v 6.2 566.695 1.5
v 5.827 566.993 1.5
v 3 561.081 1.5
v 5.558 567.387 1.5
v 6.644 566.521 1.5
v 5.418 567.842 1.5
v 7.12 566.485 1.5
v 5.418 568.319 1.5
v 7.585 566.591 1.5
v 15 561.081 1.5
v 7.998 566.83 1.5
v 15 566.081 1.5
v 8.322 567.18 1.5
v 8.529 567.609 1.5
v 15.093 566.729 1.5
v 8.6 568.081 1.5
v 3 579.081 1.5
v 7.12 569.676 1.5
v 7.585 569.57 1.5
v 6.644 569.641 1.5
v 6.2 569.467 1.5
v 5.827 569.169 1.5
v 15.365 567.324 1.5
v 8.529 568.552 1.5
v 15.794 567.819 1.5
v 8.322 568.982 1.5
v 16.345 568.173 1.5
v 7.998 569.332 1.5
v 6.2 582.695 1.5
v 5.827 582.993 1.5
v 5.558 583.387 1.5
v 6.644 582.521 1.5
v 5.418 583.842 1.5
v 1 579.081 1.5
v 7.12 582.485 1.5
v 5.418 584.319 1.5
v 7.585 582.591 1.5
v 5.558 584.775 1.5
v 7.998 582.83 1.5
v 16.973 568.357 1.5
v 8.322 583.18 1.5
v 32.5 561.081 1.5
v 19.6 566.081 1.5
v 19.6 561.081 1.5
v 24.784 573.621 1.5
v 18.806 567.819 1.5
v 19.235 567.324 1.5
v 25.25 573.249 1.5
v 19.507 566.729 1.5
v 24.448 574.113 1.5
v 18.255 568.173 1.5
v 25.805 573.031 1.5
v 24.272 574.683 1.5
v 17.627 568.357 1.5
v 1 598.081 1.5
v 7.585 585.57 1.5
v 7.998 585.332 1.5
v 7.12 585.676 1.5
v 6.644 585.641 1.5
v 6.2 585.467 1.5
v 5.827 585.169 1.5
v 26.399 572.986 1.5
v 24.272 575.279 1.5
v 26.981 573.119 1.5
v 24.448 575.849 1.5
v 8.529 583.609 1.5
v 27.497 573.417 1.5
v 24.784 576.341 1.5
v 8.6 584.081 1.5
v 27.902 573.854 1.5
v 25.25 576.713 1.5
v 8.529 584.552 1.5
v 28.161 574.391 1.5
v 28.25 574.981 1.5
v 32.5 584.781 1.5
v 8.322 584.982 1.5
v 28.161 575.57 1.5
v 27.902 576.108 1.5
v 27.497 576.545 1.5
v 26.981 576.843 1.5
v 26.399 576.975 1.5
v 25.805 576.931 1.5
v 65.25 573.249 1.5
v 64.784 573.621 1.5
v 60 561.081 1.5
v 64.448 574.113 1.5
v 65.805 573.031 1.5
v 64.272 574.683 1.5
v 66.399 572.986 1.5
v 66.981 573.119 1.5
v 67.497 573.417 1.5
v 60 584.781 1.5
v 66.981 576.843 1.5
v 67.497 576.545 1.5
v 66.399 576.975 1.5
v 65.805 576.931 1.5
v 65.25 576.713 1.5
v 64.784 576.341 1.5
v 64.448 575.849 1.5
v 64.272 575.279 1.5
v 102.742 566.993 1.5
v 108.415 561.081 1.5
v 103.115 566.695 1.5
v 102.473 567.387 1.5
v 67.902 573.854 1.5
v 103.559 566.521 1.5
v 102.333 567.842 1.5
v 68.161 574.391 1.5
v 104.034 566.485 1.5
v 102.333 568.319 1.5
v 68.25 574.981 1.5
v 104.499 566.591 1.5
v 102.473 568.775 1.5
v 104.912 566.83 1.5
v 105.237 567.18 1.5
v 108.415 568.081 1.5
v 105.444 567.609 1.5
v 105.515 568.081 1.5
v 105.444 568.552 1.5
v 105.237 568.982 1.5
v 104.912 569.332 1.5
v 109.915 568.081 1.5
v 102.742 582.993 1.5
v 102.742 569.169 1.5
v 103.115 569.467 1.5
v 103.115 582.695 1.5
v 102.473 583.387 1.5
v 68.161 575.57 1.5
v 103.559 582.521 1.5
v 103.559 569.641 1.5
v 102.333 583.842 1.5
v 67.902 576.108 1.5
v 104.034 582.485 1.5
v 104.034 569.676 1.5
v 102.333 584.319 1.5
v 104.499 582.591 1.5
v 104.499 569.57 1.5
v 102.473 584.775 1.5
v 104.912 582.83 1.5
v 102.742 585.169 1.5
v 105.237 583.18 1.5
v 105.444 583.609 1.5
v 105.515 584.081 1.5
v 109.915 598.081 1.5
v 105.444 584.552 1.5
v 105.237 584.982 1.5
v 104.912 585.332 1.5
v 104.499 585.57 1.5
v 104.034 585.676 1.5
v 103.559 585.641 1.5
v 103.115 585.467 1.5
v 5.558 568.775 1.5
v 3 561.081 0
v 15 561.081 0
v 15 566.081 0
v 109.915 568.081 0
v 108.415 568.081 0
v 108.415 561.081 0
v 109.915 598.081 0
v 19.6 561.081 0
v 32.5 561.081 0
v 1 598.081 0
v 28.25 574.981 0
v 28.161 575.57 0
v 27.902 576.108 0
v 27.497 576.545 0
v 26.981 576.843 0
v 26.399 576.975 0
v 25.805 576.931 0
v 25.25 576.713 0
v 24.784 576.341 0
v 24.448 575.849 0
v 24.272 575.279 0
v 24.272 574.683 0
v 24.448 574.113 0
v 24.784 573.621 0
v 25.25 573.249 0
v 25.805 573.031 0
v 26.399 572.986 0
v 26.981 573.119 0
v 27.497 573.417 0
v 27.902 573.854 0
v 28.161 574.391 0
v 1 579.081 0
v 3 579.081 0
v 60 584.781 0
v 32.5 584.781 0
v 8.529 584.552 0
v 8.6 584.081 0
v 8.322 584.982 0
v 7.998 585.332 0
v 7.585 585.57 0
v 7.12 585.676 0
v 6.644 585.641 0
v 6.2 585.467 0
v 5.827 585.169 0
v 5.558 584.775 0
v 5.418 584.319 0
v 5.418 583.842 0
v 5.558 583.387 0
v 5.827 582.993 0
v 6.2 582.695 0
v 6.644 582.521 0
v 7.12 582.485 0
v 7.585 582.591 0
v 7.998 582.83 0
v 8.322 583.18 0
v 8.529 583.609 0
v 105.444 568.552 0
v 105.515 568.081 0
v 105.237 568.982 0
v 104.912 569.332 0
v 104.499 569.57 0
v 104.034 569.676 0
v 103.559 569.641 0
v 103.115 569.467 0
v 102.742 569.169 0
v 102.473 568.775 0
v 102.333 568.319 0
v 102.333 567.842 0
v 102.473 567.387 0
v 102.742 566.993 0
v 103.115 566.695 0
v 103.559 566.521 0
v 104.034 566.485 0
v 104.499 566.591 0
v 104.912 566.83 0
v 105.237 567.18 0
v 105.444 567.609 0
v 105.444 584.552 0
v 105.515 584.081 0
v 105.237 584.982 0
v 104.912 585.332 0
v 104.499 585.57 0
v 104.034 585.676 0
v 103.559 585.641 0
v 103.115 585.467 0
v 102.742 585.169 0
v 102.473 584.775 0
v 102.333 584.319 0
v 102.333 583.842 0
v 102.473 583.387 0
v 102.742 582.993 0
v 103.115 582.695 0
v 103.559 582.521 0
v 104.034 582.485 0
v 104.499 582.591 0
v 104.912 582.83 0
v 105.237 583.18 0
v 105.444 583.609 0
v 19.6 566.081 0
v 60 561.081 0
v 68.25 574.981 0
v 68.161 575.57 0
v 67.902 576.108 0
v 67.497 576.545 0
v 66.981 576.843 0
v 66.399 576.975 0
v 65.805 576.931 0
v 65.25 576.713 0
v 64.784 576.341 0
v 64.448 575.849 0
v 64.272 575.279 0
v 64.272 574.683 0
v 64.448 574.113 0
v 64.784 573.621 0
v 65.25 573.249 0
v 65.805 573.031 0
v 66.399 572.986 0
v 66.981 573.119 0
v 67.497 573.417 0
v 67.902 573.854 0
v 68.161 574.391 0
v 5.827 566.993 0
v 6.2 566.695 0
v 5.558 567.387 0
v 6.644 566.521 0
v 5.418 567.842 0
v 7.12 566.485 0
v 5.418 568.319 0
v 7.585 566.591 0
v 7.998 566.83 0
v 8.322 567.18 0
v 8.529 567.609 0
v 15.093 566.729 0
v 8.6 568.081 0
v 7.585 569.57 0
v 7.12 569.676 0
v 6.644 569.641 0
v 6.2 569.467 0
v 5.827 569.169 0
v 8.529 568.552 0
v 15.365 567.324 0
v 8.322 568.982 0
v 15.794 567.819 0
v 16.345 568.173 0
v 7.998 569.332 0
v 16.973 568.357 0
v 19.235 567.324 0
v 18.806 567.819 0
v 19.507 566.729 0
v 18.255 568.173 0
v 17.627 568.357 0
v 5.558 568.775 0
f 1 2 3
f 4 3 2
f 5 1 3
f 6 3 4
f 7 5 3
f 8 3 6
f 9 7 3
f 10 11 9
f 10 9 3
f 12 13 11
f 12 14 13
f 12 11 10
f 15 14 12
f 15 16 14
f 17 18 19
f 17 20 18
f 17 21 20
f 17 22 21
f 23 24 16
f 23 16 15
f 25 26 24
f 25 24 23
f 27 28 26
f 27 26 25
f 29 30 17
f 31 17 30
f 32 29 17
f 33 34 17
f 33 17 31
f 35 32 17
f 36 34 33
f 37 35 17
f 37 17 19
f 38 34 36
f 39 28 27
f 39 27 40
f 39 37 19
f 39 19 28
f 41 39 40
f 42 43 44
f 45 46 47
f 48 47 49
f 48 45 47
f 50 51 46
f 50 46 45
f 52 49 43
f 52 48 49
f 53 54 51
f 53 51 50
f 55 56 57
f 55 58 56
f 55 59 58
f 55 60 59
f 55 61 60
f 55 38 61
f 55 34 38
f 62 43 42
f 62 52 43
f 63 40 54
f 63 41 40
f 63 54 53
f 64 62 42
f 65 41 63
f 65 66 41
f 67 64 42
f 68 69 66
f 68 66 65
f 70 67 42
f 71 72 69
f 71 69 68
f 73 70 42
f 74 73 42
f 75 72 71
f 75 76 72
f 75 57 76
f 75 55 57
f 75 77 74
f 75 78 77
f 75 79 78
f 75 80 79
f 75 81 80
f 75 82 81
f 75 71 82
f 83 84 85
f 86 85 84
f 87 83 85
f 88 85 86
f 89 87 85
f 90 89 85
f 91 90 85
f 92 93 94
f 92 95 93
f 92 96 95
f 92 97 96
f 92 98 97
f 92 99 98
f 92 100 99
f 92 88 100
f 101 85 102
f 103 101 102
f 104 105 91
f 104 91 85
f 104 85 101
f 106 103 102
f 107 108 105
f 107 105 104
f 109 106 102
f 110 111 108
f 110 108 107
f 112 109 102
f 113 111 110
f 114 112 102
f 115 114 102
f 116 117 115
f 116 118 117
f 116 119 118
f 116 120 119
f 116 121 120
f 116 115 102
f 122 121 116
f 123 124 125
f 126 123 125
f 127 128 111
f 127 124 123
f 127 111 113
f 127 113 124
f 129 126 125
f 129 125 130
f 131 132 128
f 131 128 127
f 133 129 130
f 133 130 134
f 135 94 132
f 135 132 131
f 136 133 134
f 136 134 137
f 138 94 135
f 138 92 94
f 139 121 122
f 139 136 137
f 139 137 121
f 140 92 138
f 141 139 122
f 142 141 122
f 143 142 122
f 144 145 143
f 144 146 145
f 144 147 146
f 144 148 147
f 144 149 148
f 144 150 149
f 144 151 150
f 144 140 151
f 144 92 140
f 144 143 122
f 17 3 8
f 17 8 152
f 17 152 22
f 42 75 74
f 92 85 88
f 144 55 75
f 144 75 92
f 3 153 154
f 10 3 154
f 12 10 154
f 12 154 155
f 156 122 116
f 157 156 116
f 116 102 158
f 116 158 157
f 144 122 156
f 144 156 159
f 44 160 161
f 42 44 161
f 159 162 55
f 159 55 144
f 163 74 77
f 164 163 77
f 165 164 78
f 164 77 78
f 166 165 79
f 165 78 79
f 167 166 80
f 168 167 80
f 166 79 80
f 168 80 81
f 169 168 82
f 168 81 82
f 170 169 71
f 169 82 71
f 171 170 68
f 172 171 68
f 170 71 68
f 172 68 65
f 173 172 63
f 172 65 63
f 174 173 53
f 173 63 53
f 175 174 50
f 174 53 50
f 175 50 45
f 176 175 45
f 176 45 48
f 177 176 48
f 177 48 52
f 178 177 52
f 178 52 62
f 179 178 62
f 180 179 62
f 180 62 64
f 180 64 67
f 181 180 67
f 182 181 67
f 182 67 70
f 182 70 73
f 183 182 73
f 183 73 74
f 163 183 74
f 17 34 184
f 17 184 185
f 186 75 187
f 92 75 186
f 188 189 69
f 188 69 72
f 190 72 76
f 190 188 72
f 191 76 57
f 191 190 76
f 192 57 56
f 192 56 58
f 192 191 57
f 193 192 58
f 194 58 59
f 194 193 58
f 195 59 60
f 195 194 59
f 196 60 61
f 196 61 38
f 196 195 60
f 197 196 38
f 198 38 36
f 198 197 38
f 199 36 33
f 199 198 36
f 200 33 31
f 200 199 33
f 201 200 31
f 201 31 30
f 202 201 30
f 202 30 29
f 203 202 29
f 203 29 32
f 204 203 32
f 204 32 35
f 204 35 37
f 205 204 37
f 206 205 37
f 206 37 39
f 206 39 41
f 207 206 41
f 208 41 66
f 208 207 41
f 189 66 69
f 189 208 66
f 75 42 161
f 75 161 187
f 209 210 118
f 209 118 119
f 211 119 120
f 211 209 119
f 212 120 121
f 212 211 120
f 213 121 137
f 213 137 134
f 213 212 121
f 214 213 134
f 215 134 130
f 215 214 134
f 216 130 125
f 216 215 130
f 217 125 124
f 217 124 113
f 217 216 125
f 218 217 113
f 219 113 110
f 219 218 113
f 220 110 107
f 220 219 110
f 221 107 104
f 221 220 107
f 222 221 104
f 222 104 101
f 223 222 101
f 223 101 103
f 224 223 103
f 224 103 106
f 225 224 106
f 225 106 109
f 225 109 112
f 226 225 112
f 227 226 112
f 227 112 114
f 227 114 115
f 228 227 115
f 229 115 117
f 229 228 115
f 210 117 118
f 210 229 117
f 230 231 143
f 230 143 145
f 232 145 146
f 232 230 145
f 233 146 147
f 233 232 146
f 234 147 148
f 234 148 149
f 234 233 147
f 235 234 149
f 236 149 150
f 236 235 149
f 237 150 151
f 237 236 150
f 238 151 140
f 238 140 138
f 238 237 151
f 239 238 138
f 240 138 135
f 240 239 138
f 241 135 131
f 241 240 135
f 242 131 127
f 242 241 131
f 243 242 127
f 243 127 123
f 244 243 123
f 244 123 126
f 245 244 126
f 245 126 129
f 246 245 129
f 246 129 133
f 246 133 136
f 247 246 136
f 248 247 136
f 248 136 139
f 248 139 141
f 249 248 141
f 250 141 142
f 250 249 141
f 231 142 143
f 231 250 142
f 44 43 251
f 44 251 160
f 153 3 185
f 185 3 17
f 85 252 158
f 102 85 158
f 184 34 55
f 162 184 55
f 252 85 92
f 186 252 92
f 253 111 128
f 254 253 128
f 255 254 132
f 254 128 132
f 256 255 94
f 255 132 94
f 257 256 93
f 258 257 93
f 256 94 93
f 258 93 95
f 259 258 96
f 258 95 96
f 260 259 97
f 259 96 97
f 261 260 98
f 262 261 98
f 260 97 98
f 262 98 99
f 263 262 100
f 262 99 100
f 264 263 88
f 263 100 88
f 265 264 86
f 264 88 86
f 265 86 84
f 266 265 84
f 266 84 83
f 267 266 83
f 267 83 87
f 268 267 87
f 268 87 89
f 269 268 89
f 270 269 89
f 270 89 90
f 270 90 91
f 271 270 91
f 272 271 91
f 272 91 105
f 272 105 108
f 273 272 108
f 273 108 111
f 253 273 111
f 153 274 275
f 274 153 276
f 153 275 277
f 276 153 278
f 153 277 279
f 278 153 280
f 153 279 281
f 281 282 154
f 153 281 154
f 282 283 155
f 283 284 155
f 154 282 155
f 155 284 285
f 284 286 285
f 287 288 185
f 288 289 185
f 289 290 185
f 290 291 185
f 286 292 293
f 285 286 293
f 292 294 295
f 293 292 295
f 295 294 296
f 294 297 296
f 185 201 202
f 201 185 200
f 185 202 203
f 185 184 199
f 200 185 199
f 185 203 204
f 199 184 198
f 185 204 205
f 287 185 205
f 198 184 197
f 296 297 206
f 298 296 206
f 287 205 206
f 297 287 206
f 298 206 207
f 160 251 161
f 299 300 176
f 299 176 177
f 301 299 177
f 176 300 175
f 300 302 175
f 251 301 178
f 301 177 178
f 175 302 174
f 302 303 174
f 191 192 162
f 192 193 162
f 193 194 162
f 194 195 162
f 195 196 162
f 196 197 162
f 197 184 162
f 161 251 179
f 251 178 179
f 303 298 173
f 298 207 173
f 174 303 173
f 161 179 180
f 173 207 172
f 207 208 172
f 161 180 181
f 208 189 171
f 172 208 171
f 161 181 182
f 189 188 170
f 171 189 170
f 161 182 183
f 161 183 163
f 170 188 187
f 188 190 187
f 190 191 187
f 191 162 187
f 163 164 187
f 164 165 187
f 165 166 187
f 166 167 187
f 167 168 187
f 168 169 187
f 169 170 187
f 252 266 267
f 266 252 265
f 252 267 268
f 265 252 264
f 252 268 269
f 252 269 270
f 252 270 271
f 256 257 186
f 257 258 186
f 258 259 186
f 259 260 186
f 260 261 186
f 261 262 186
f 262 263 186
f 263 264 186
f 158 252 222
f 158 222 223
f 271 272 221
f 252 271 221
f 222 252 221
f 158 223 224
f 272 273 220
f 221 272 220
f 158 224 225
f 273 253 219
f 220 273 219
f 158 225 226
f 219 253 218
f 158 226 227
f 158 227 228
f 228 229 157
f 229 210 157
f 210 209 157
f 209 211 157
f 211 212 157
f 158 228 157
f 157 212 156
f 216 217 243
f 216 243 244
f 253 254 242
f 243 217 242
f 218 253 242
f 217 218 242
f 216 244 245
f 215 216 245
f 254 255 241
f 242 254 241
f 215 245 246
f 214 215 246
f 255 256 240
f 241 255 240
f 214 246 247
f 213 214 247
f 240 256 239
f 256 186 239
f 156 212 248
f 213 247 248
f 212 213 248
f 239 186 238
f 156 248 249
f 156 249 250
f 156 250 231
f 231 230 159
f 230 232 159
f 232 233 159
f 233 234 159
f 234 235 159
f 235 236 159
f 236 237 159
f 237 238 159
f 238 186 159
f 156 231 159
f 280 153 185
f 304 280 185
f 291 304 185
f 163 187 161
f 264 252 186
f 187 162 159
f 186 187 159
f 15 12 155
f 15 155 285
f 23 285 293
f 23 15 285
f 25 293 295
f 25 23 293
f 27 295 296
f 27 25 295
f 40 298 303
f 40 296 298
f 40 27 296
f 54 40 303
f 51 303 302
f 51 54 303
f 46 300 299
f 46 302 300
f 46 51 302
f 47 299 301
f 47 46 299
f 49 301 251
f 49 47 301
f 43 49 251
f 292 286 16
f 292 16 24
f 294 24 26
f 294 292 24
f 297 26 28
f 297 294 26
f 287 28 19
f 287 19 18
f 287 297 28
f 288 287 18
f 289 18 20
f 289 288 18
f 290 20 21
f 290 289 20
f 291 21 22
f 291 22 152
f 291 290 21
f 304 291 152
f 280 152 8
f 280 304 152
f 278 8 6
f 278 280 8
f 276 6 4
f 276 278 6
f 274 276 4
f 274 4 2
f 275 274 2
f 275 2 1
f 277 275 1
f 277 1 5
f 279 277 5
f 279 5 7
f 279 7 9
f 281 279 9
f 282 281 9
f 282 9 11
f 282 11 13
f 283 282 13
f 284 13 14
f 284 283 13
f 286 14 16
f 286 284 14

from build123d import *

# Parameters (mm, degrees)
SKETCH1_W           = 110.914742868
SKETCH1_H           = 37
SKETCH1_R           = 1.6
BOSS_EXTRUDE1_DEPTH = 1.5
SKETCH2_W           = 3
SKETCH2_H           = 18
CUT_EXTRUDE1_DEPTH  = 1.5
SKETCH3_W           = 1.5
SKETCH3_H           = 7
SKETCH3_W_2         = 1
SKETCH3_H_2         = 30
SKETCH3_H_3         = 19
CUT_EXTRUDE2_DEPTH  = 10
SKETCH4_R           = 2
SKETCH4_W           = 27.5
SKETCH4_H           = 23.7
CUT_EXTRUDE3_DEPTH  = 10


with BuildPart() as part:
    # Sketch1 → Boss-Extrude1 (new body)
    with BuildSketch(Plane.XY):
        with Locations((55.457371434, 579.580871166)):
            Rectangle(SKETCH1_W, SKETCH1_H)
        with Locations((103.914742868, 584.080871166)):
            Circle(SKETCH1_R, mode=Mode.SUBTRACT)
        with Locations((103.914742868, 568.080871166)):
            Circle(SKETCH1_R, mode=Mode.SUBTRACT)
        with Locations((7, 584.080871166)):
            Circle(SKETCH1_R, mode=Mode.SUBTRACT)
        with Locations((7, 568.080871166)):
            Circle(SKETCH1_R, mode=Mode.SUBTRACT)
    extrude(amount=BOSS_EXTRUDE1_DEPTH)

    # Sketch2 → Cut-Extrude1 (cut)
    with BuildSketch(Plane.XY.offset(1.5)):
        with Locations((1.5, 570.080871166)):
            Rectangle(SKETCH2_W, SKETCH2_H)
    extrude(amount=-CUT_EXTRUDE1_DEPTH, mode=Mode.SUBTRACT)

    # Sketch3 → Cut-Extrude2 (cut)
    with BuildSketch(Plane.XY.offset(1.5)):
        with Locations((109.164742868, 564.580871166)):
            Rectangle(SKETCH3_W, SKETCH3_H)
        with Locations((110.414742868, 564.580871166)):
            Rectangle(SKETCH3_W_2, SKETCH3_H)
        with Locations((110.414742868, 583.080871166)):
            Rectangle(SKETCH3_W_2, SKETCH3_H_2)
        with Locations((0.5, 588.580871166)):
            Rectangle(SKETCH3_W_2, SKETCH3_H_3)
    extrude(amount=-CUT_EXTRUDE2_DEPTH, mode=Mode.SUBTRACT)

    # Sketch4 → Cut-Extrude3 (cut)
    with BuildSketch(Plane.XY.offset(1.5)):
        with Locations((66.25, 574.980871166)):
            Circle(SKETCH4_R)
        with Locations((26.25, 574.980871166)):
            Circle(SKETCH4_R)
        with Locations((46.25, 572.930871166)):
            Rectangle(SKETCH4_W, SKETCH4_H)
        with BuildLine():
            Line((15, 561.080871166), (15, 566.080871166))
            ThreePointArc((15, 566.080871166), (17.3, 568.380871166), (19.6, 566.080871166))
            Line((19.6, 566.080871166), (19.6, 561.080871166))
            ThreePointArc((19.6, 561.080871166), (17.3, 558.780871166), (15, 561.080871166))
        make_face()
    extrude(amount=-CUT_EXTRUDE3_DEPTH, mode=Mode.SUBTRACT)


solid = part.part
